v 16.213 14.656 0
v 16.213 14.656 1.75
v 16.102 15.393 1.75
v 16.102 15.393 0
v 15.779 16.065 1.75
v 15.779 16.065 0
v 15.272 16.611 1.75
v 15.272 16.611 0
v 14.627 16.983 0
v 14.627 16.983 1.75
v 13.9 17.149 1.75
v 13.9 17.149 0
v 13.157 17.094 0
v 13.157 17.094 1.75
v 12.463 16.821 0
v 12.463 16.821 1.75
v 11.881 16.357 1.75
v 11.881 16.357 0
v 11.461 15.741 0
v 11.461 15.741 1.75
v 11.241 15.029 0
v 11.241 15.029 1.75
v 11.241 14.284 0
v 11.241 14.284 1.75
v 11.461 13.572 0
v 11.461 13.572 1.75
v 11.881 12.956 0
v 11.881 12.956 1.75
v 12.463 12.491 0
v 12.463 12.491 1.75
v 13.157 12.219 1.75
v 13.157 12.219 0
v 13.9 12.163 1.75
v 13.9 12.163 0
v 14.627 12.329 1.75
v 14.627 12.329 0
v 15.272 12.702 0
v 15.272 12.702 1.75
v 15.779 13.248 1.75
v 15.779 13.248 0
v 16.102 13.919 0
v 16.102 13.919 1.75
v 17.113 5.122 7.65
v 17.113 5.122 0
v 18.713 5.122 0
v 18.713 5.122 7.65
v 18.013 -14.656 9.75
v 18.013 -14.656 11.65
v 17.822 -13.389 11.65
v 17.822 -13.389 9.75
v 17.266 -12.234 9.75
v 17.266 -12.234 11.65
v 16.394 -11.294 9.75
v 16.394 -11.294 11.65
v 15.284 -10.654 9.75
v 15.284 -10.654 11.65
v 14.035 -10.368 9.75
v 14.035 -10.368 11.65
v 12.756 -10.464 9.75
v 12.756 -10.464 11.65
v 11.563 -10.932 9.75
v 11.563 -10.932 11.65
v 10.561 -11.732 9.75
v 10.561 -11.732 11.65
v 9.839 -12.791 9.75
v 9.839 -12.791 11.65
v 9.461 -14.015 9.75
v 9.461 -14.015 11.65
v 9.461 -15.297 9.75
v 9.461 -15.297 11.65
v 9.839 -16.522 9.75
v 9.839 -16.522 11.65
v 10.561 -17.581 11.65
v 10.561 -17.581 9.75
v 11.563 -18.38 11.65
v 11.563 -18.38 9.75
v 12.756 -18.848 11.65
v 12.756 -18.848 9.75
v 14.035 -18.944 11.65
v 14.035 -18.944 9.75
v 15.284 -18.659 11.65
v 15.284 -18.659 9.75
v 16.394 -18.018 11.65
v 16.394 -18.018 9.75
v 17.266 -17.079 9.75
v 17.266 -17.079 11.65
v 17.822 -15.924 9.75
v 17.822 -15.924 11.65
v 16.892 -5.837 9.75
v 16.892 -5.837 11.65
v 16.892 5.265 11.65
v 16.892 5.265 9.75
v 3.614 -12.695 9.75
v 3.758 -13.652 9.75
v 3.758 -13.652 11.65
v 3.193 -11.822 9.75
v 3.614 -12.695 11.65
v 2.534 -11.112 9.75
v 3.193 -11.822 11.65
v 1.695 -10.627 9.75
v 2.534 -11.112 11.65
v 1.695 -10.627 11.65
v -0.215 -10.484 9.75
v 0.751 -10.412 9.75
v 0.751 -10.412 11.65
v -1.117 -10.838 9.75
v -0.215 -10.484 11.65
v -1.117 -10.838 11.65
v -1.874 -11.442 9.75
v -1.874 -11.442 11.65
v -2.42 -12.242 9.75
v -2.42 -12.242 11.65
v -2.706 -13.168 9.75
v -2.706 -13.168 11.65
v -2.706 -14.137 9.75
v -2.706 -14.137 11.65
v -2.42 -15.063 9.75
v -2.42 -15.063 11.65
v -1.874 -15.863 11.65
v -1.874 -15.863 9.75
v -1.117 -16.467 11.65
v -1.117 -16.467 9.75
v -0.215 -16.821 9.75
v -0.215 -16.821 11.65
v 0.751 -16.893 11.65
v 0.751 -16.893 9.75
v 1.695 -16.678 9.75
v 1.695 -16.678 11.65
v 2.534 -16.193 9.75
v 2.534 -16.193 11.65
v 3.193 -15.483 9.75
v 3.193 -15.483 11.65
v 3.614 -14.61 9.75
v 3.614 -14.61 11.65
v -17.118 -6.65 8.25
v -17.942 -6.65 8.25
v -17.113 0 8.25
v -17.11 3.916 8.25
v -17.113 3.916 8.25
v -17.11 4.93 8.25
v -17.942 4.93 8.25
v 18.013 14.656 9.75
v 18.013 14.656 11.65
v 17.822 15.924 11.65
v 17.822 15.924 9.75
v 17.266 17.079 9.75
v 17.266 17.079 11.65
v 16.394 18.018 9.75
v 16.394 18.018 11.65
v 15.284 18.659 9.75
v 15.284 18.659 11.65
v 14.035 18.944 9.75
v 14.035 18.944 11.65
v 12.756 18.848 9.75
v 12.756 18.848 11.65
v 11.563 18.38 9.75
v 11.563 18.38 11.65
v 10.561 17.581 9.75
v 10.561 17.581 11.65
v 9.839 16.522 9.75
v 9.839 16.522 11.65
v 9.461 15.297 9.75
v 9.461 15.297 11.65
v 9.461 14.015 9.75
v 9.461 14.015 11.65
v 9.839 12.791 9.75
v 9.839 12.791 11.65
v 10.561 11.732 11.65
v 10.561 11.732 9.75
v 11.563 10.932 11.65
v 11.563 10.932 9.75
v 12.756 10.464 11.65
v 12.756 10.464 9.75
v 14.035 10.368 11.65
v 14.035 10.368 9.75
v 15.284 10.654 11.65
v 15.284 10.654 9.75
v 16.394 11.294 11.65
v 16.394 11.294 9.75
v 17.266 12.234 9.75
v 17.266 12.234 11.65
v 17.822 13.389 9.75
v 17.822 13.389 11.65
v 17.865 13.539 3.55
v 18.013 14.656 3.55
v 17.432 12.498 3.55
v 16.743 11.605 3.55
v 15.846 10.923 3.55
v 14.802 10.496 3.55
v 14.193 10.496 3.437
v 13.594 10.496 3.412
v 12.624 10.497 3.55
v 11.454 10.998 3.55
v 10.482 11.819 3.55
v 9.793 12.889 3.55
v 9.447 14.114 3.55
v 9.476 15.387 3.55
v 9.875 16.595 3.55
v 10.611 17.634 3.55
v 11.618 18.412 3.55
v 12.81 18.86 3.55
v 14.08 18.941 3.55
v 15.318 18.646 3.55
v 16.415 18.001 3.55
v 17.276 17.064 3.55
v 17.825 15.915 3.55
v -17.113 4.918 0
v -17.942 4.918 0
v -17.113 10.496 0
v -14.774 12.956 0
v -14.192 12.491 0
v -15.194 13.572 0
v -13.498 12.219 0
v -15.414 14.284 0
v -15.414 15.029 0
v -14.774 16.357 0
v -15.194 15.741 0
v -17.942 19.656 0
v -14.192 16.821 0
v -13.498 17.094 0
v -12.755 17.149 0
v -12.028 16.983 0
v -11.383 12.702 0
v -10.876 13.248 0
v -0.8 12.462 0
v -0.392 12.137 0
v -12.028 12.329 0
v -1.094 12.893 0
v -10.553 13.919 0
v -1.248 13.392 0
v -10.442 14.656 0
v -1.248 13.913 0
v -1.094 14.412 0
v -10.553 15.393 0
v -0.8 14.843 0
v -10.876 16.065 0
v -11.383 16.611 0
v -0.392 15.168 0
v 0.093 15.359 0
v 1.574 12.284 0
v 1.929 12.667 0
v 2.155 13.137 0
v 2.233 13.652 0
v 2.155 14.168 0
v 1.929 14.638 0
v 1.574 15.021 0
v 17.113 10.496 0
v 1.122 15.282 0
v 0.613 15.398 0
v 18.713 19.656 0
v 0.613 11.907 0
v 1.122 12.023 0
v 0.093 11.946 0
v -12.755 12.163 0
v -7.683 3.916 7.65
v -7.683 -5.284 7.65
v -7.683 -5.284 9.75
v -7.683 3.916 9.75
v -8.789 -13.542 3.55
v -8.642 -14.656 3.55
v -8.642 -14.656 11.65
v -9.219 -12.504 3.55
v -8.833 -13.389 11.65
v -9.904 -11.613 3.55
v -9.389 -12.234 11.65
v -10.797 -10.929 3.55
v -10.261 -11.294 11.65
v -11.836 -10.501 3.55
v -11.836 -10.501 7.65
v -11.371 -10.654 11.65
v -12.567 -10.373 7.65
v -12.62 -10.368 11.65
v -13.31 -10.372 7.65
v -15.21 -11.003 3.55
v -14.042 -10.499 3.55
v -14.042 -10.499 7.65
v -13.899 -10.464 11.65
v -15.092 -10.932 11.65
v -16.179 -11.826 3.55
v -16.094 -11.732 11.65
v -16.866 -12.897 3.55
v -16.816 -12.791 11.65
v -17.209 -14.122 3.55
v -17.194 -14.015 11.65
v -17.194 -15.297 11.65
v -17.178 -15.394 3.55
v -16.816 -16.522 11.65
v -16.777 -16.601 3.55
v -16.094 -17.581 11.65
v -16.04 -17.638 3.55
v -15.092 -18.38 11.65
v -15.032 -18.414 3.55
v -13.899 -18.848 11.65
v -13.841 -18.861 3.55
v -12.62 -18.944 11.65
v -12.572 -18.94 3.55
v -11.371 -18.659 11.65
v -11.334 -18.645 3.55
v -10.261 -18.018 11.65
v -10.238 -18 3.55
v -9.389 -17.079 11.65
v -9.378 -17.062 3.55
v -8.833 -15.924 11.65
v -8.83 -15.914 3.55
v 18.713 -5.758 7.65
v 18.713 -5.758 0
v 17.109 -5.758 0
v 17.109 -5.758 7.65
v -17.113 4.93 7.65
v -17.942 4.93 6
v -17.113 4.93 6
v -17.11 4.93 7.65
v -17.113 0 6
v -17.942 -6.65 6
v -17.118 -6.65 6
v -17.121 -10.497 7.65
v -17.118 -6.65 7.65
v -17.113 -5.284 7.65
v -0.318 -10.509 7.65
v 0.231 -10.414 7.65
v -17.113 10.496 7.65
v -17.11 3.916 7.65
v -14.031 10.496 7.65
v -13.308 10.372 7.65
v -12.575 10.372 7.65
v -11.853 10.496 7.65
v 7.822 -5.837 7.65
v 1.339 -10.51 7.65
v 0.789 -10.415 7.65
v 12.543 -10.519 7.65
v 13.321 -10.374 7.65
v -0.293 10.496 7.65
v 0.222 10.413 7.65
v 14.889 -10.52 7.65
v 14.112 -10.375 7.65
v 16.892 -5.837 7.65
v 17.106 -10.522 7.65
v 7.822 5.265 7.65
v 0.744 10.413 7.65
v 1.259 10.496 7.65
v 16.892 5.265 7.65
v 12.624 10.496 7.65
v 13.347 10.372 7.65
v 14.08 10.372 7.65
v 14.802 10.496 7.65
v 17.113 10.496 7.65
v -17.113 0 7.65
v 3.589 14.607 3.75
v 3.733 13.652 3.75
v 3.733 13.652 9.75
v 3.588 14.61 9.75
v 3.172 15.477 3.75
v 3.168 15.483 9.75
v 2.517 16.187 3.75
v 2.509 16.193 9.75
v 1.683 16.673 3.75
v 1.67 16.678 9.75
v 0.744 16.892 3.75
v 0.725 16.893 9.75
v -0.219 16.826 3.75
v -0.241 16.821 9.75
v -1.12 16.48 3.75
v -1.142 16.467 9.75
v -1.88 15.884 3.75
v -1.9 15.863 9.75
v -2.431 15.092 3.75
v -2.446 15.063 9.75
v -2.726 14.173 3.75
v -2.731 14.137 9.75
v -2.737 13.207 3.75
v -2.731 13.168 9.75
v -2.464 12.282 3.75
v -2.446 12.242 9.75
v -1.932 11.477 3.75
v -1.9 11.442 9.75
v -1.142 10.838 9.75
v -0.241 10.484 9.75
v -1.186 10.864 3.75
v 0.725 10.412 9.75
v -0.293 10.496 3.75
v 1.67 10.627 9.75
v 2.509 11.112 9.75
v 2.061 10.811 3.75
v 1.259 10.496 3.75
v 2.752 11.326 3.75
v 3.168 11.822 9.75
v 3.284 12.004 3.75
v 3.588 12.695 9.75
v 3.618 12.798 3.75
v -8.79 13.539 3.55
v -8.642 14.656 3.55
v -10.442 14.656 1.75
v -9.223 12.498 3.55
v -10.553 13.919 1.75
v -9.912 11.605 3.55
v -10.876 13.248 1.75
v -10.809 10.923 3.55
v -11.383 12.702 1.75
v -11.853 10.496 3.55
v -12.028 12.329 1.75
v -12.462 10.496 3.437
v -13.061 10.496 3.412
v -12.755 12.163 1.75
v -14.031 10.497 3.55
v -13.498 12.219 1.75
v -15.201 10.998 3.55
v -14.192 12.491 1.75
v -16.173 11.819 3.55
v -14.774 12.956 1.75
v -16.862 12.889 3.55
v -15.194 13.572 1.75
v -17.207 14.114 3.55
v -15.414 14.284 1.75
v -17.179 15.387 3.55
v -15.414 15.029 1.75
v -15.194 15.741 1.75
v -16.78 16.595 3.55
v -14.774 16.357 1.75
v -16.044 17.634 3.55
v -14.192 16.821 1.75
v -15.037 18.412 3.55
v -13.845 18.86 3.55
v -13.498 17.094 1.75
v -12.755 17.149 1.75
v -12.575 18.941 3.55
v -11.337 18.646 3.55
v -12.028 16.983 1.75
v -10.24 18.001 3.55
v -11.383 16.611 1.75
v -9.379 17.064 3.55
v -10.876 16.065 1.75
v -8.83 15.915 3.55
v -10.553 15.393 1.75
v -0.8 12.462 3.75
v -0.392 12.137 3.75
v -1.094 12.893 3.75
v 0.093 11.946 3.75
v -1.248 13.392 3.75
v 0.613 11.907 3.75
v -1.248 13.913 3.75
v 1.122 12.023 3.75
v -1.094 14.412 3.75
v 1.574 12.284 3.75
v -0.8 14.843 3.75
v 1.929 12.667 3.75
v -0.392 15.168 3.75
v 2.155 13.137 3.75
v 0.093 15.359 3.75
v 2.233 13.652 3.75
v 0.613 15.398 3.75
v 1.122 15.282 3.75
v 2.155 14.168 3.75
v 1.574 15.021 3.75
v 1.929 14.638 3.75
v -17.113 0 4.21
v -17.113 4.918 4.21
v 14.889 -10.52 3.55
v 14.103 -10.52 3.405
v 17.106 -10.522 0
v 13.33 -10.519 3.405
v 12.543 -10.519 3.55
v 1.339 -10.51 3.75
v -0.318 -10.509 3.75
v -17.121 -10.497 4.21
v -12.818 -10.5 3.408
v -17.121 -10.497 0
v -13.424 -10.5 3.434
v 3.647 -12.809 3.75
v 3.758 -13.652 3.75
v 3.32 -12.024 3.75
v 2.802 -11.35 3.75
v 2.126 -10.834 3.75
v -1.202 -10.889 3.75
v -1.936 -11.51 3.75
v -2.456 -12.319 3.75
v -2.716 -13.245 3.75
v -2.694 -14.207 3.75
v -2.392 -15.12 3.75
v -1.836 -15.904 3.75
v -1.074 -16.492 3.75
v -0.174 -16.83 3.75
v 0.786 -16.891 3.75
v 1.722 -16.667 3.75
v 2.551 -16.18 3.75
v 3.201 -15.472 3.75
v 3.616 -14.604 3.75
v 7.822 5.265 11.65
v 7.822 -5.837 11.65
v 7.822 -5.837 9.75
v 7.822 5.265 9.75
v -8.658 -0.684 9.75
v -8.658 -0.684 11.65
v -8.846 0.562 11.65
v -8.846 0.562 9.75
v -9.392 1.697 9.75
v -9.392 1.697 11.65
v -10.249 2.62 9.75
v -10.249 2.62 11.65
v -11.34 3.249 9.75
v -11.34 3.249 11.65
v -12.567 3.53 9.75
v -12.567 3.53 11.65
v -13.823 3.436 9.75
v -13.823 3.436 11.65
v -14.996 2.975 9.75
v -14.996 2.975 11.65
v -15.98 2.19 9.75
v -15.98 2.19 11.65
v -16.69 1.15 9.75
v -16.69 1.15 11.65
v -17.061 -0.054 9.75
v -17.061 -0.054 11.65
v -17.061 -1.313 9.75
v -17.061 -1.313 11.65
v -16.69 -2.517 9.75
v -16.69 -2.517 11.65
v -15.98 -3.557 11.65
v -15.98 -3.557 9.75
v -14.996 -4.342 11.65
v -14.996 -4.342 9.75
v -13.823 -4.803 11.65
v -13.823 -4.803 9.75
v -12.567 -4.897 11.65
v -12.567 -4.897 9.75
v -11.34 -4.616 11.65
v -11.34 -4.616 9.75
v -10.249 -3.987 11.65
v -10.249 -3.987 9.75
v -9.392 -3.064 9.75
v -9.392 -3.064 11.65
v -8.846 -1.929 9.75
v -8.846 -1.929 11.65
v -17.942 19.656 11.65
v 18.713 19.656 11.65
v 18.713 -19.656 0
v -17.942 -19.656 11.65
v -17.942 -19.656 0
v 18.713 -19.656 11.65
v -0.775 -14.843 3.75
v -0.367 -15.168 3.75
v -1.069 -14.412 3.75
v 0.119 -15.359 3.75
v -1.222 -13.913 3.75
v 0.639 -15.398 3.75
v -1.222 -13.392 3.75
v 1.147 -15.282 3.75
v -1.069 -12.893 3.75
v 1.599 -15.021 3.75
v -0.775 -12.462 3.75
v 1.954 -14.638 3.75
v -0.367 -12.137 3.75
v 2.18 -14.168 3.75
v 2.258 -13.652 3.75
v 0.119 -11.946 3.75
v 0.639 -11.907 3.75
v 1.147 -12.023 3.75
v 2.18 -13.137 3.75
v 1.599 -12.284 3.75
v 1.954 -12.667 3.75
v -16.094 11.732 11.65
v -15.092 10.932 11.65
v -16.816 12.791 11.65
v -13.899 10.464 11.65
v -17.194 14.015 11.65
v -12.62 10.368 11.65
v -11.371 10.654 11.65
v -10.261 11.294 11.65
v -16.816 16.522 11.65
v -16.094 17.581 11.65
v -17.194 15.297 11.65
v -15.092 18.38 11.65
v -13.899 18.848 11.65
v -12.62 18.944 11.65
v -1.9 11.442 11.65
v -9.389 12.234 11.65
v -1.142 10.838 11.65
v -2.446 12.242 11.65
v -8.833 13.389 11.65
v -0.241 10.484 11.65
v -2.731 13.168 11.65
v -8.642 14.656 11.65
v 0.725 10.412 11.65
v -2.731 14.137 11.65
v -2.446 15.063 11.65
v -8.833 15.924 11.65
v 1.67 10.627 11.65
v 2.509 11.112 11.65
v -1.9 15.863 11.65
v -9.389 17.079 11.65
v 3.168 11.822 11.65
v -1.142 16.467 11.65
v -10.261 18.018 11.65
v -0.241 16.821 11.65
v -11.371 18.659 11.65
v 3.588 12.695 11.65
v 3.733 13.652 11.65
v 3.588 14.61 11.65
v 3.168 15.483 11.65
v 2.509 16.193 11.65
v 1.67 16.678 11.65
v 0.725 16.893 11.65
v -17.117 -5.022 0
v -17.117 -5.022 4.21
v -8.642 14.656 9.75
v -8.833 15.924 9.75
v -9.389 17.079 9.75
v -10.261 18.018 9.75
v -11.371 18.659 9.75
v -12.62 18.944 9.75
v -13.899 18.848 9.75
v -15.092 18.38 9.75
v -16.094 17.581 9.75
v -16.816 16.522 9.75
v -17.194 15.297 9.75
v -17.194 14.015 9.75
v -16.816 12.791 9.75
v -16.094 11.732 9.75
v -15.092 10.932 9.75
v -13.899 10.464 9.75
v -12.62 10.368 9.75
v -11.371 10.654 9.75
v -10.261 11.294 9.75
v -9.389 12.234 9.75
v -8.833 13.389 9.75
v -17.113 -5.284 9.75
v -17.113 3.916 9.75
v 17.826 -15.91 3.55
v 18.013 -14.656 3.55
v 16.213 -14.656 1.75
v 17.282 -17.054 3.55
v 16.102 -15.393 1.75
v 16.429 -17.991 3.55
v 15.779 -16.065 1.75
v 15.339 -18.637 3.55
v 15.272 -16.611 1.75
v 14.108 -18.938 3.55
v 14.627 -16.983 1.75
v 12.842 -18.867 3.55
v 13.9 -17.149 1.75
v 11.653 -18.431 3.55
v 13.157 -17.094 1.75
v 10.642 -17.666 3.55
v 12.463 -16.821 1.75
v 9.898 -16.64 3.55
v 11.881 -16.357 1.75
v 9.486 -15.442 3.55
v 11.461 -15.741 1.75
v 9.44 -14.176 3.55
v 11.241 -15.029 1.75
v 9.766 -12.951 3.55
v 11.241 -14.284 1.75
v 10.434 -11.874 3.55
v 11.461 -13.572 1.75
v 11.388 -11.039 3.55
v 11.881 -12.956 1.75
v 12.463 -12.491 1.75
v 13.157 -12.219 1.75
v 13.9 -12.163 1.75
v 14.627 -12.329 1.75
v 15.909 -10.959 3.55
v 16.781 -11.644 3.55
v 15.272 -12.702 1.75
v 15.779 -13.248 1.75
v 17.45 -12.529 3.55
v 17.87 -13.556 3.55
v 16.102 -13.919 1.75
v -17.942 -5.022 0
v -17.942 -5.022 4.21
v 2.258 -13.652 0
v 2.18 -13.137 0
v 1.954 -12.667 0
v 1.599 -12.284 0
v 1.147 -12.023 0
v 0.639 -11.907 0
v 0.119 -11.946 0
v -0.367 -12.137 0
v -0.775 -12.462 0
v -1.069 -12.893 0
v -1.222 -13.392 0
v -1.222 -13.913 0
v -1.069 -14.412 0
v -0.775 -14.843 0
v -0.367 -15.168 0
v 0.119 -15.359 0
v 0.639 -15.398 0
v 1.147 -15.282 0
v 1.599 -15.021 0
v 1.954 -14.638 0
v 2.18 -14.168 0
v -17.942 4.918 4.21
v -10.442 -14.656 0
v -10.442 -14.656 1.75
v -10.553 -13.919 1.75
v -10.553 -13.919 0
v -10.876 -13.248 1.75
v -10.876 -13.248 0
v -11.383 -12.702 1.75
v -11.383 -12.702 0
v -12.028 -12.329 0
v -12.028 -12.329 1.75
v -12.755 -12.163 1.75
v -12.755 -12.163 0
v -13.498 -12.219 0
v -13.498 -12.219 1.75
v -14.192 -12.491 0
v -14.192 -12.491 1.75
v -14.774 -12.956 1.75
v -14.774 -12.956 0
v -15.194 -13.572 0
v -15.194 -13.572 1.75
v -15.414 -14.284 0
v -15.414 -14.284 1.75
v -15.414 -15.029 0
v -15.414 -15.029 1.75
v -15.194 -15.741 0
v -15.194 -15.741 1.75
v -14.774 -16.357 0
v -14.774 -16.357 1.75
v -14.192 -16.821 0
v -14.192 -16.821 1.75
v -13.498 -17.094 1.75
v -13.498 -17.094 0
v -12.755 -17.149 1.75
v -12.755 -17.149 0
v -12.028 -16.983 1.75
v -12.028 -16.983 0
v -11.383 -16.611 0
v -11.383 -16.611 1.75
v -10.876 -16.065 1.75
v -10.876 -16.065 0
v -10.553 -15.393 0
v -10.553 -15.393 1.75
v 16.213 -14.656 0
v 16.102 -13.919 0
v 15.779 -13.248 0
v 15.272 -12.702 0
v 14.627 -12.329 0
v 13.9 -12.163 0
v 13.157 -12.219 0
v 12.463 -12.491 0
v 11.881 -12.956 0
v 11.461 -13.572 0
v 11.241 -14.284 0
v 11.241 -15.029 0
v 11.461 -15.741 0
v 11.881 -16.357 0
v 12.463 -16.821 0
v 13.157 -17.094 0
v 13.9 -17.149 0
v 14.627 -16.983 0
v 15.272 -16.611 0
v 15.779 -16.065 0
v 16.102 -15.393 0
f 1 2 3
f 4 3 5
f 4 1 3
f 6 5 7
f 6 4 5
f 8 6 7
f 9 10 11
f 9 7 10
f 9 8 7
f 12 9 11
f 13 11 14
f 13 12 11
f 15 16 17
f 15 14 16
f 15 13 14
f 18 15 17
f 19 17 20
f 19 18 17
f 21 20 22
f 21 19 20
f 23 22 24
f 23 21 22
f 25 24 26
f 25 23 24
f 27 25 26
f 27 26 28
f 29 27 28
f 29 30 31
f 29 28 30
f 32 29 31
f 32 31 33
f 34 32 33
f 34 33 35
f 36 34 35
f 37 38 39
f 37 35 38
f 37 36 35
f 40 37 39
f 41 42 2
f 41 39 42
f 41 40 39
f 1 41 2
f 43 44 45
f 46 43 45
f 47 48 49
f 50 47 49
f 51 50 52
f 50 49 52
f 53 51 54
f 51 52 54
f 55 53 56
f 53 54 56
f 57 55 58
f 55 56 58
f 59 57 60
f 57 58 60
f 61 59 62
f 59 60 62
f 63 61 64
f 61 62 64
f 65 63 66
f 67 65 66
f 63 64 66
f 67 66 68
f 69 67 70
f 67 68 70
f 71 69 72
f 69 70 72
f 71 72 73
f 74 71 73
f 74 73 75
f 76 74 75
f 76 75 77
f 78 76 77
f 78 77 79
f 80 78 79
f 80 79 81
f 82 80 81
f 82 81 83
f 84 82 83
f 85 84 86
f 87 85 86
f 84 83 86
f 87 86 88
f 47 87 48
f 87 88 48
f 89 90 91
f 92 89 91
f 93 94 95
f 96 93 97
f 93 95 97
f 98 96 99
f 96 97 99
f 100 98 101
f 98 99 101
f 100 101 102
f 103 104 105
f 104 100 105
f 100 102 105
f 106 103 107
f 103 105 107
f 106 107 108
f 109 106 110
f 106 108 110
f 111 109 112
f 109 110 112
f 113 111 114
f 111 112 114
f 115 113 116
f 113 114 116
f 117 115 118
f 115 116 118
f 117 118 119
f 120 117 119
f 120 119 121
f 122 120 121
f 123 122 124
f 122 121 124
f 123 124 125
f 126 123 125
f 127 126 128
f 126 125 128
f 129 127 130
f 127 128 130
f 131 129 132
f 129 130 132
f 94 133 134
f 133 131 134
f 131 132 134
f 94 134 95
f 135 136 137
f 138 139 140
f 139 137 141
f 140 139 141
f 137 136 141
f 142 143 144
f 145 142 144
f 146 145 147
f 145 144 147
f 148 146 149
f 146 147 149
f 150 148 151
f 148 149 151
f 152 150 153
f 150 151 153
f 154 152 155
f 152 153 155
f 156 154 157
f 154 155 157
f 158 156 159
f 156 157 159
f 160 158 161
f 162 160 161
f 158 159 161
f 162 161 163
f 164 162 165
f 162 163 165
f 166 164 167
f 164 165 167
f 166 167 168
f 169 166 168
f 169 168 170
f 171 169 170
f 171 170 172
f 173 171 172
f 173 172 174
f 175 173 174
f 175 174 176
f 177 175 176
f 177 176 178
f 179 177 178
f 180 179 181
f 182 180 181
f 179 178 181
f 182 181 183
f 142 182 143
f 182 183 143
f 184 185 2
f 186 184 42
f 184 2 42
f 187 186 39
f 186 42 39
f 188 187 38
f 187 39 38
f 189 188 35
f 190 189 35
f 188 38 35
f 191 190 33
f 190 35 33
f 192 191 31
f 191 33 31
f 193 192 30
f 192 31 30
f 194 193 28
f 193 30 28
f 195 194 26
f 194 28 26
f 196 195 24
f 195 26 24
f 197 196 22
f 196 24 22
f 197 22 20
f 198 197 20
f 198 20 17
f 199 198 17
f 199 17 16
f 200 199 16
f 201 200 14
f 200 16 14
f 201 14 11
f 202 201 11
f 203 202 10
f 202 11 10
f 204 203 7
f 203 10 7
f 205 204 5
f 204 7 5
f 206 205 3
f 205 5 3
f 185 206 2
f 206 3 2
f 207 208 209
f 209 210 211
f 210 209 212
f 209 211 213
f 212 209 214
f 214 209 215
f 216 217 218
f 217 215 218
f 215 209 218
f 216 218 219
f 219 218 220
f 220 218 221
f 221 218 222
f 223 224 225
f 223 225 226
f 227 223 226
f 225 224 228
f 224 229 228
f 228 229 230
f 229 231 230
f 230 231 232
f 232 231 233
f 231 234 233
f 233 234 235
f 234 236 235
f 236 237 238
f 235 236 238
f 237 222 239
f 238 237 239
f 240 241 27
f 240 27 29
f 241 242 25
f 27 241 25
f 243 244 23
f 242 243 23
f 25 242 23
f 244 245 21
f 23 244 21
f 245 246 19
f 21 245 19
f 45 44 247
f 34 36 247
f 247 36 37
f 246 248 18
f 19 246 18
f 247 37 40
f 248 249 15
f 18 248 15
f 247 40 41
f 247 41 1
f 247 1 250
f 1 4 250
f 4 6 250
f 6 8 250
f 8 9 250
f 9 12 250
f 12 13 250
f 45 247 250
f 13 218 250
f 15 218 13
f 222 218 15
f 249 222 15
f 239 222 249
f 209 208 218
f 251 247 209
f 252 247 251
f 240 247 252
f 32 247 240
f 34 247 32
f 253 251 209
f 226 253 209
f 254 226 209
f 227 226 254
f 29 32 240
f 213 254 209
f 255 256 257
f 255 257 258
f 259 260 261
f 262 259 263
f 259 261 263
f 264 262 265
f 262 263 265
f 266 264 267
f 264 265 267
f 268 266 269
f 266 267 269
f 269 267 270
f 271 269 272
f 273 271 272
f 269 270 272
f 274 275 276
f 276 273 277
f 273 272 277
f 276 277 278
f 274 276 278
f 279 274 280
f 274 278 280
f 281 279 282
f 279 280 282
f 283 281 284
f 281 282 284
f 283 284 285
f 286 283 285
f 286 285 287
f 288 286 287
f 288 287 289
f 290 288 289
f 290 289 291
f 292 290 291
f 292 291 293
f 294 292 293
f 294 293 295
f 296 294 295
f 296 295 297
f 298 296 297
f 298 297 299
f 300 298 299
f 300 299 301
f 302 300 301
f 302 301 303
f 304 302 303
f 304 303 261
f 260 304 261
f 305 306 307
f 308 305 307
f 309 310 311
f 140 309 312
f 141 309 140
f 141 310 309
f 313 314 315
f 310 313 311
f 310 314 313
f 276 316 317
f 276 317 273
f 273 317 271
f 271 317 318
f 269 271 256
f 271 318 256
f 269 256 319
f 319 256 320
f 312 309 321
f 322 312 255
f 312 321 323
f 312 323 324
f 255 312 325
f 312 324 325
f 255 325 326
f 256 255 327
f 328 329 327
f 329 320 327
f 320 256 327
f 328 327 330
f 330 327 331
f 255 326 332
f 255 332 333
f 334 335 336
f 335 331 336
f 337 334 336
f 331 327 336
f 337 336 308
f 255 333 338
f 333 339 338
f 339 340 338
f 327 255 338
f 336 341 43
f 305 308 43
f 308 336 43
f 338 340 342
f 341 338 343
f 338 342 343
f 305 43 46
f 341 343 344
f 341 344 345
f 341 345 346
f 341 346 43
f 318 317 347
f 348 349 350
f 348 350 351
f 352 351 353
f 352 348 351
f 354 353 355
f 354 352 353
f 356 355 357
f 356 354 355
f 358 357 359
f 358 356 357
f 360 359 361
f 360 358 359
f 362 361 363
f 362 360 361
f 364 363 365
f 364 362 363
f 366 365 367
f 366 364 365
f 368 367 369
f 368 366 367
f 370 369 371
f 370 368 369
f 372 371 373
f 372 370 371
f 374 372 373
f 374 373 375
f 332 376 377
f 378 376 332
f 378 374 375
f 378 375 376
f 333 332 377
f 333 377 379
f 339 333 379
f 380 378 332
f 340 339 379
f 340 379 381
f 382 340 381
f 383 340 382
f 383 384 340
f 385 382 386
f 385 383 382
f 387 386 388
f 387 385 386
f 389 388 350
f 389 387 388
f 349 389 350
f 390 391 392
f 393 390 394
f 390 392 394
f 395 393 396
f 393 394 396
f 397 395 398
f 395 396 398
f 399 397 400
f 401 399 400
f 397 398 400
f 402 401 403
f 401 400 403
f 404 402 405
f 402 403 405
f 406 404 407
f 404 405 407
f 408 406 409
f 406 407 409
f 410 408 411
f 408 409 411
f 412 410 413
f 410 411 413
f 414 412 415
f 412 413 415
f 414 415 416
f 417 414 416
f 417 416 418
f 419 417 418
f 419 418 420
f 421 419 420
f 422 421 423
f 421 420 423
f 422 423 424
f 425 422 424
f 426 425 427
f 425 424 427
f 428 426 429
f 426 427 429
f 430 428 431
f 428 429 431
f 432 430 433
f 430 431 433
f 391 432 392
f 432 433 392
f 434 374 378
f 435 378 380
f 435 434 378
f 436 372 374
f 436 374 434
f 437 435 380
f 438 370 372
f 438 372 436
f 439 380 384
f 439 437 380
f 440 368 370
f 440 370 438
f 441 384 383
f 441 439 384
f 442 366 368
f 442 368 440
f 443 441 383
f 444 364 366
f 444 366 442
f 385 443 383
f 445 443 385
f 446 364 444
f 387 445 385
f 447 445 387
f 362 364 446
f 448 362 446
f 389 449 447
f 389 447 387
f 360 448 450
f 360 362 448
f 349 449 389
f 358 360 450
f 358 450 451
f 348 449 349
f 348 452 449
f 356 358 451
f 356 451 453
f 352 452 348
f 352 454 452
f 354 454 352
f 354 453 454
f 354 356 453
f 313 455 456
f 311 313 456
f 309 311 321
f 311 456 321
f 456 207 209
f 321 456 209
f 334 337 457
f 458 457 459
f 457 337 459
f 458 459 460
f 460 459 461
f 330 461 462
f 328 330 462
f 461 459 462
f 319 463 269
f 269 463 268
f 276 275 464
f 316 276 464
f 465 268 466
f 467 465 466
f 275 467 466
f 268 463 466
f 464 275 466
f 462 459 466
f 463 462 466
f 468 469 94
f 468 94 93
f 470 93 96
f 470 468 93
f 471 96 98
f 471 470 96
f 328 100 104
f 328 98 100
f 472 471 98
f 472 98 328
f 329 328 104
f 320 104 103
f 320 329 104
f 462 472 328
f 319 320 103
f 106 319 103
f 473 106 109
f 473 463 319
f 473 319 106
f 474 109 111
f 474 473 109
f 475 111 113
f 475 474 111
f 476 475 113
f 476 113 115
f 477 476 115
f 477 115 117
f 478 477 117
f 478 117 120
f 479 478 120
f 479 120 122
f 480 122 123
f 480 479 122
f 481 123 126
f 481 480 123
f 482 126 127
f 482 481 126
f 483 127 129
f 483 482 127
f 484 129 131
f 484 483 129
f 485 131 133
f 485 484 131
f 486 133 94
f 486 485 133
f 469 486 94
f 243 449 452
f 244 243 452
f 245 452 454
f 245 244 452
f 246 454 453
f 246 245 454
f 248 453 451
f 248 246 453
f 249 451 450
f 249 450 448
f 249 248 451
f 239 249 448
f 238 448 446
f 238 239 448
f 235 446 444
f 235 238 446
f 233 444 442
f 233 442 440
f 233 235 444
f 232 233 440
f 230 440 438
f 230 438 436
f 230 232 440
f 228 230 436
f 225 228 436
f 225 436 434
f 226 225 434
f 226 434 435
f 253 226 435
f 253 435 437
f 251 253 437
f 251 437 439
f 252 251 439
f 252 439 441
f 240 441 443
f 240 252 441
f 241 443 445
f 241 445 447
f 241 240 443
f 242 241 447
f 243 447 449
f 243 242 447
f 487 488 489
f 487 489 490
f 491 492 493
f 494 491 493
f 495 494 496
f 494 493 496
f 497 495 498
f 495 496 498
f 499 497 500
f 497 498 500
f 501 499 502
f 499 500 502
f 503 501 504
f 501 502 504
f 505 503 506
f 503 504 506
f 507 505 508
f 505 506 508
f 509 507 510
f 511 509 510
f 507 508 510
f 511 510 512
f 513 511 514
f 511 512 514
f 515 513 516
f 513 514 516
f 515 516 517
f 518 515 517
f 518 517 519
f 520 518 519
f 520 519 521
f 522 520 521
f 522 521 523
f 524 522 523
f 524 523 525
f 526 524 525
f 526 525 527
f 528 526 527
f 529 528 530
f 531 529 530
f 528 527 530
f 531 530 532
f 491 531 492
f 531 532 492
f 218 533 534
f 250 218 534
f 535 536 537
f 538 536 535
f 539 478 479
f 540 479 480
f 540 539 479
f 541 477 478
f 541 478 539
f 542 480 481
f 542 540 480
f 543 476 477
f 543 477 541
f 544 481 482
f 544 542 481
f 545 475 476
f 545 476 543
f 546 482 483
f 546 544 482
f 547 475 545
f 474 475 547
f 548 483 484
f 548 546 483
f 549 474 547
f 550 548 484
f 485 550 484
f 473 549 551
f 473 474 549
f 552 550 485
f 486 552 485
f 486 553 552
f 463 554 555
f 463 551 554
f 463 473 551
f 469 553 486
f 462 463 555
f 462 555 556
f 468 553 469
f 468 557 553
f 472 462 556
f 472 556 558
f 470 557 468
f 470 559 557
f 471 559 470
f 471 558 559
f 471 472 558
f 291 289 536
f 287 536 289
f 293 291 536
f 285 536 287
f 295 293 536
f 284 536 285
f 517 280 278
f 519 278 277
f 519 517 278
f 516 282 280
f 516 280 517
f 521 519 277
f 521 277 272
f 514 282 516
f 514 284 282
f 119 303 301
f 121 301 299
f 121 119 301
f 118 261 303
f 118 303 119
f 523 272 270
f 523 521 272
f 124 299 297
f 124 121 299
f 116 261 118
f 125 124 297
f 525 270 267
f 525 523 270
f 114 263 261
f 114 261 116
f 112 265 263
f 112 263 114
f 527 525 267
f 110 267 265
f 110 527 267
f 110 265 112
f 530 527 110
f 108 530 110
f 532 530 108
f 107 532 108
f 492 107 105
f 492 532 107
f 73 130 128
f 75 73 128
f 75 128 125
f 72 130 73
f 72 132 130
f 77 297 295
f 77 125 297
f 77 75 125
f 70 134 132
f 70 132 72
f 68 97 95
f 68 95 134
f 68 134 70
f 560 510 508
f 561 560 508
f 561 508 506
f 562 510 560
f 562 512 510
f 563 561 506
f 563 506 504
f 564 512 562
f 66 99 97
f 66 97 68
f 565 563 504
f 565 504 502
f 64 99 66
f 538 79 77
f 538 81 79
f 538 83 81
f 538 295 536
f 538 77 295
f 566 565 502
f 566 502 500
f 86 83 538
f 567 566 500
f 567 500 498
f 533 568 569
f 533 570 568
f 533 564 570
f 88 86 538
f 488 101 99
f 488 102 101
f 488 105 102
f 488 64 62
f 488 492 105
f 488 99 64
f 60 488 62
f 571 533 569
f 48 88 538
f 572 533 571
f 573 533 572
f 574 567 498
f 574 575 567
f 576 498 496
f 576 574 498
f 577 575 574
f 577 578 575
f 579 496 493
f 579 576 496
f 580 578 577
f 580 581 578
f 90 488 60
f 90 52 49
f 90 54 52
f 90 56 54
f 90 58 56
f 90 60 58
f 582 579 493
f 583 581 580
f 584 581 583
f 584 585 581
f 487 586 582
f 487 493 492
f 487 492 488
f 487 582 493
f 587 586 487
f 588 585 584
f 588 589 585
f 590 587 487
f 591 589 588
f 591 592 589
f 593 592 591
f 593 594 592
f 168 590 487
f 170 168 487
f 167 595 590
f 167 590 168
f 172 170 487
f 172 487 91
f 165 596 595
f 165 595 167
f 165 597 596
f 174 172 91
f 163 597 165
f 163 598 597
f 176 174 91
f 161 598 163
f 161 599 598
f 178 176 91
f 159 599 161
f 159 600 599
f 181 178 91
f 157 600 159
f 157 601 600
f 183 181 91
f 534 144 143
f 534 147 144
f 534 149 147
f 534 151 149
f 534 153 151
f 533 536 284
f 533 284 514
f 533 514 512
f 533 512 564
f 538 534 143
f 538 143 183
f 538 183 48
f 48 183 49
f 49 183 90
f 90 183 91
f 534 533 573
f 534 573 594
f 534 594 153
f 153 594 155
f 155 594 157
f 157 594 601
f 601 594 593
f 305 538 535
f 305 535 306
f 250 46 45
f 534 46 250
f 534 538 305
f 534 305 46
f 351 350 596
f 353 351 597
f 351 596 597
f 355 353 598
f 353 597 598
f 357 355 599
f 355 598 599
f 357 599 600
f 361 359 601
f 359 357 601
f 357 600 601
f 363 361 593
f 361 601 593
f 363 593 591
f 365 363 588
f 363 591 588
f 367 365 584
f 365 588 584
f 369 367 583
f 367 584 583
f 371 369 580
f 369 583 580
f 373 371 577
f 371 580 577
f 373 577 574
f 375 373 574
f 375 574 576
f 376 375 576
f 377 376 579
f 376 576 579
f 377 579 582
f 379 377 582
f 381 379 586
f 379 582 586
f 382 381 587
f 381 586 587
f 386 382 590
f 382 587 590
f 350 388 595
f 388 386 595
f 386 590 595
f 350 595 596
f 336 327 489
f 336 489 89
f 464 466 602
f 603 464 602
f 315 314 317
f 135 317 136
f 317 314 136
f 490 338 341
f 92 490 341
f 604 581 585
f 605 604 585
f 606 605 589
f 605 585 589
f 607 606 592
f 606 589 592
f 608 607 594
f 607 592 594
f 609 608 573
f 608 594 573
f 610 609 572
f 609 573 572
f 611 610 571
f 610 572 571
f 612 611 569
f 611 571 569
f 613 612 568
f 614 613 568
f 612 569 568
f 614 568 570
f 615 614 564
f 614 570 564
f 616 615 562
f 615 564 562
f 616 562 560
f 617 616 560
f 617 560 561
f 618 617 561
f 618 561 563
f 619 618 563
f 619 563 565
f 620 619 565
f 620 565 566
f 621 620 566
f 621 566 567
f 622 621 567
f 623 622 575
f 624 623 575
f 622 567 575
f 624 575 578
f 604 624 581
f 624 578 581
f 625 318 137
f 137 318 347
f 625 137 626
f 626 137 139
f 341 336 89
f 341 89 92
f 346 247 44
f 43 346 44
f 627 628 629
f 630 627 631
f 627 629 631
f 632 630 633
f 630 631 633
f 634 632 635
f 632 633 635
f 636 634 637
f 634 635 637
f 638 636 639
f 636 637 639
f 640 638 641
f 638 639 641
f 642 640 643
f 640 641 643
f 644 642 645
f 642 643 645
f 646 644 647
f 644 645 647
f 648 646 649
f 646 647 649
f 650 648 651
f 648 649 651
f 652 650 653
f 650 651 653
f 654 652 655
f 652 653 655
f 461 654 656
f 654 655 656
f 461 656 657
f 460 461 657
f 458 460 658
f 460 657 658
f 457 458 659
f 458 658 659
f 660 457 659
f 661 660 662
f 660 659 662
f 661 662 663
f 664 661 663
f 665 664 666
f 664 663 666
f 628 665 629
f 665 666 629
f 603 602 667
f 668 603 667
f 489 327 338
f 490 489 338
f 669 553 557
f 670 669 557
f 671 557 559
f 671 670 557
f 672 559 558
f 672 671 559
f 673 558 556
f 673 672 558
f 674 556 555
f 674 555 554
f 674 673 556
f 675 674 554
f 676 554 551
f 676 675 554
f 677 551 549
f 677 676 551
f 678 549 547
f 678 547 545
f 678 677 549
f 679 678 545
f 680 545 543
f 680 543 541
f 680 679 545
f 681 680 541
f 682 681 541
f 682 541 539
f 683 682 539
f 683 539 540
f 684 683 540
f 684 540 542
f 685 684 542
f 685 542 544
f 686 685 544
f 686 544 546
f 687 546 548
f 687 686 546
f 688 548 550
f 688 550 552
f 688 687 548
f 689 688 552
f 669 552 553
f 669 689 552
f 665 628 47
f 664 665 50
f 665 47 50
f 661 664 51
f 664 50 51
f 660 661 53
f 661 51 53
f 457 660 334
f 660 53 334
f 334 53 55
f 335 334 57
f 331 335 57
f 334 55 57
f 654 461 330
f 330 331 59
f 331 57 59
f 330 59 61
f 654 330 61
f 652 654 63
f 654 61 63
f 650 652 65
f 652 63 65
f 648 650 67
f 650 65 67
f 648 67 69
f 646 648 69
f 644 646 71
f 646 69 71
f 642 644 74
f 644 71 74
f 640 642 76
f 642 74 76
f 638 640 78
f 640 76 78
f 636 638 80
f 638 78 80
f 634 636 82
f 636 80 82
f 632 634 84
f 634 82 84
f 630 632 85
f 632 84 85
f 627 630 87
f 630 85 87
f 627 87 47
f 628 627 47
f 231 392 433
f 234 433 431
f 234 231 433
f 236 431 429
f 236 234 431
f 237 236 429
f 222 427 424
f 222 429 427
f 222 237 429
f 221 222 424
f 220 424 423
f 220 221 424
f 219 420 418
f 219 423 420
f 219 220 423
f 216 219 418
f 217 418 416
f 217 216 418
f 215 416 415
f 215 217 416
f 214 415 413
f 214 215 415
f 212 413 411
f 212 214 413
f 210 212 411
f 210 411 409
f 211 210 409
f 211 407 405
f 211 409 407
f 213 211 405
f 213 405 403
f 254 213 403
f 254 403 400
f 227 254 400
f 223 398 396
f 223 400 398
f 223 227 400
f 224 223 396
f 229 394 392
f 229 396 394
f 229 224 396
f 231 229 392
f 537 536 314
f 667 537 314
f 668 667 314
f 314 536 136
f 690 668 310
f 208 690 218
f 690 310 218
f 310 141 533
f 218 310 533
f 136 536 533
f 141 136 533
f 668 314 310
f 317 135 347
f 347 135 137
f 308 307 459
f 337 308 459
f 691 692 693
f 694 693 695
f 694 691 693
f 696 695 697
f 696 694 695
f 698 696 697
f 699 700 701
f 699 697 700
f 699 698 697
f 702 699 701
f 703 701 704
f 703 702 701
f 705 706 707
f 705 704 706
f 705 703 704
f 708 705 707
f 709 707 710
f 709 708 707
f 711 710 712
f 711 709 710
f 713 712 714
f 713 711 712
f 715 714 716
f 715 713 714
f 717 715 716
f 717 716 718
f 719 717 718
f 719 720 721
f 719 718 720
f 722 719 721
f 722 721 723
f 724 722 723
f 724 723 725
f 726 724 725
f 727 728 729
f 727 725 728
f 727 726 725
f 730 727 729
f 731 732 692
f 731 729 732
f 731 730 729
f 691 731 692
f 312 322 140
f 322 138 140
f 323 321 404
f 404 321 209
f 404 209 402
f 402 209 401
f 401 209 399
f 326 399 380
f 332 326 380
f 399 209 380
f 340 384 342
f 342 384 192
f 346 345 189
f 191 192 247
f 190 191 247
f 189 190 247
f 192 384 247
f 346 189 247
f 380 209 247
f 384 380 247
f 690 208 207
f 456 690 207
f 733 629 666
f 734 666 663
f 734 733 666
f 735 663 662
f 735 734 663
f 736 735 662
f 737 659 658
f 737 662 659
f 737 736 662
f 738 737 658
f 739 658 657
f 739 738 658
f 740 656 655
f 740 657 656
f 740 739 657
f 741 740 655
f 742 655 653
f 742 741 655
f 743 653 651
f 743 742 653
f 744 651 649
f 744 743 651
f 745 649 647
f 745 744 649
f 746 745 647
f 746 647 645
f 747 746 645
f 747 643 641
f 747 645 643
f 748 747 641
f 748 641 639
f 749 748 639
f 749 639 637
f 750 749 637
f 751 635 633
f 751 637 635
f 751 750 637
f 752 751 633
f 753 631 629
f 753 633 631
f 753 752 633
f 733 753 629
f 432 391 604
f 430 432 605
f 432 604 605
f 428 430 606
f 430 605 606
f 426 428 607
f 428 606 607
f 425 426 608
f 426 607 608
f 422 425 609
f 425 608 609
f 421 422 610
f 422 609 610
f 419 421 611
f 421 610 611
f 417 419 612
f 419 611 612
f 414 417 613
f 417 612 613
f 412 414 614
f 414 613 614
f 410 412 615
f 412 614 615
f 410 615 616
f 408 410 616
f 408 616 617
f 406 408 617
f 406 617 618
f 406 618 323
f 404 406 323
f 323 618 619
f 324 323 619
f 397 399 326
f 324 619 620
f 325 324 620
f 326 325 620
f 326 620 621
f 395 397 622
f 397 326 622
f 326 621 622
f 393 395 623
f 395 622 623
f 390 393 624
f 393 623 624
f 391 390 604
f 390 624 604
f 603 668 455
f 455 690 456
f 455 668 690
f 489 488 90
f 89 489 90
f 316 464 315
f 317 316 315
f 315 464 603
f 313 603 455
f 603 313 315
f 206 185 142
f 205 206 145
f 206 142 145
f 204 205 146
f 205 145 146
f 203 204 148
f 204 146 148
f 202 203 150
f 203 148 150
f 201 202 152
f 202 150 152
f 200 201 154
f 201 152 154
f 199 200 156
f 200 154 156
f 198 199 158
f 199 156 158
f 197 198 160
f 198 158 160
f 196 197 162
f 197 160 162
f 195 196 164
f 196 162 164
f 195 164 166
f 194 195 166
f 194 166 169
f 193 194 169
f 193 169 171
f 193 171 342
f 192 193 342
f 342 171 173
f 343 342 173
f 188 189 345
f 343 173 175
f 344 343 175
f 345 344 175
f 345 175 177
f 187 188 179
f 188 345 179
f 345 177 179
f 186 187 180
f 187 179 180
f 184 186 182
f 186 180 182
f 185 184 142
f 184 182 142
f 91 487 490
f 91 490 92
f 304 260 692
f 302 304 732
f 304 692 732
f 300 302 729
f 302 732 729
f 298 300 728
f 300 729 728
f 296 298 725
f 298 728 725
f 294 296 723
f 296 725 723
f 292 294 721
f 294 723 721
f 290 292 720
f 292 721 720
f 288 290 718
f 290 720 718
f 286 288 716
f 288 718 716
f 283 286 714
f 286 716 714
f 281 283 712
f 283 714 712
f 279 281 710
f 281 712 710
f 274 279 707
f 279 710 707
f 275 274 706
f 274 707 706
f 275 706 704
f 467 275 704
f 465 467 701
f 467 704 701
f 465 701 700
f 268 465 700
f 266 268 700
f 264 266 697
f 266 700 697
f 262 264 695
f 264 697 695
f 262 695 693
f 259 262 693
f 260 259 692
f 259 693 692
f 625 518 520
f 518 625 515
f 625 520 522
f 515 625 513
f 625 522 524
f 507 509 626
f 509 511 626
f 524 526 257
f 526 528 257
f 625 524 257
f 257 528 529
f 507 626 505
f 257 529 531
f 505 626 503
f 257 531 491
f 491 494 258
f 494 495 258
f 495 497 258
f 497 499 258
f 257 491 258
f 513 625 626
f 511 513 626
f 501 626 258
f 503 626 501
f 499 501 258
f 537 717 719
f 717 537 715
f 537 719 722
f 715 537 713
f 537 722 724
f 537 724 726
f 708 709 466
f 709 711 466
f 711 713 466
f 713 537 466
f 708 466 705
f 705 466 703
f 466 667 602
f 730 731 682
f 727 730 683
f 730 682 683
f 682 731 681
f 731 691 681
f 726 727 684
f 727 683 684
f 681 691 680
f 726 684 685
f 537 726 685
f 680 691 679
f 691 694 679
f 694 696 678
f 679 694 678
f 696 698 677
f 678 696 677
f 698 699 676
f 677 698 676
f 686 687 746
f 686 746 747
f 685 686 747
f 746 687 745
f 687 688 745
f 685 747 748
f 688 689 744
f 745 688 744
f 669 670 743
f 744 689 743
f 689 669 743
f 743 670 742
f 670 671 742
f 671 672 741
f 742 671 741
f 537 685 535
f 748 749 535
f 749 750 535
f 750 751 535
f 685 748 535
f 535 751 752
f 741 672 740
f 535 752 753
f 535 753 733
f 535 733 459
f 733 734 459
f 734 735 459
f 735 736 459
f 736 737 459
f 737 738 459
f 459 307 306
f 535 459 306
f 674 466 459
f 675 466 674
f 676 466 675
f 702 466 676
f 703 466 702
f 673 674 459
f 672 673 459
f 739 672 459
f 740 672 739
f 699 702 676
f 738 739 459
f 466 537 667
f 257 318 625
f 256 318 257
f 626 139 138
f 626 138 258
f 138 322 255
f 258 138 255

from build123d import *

# Parameters (mm, degrees)
BOSS_EXTRUDE1_OUTLINE_R   = 2.5
BOSS_EXTRUDE1_OUTLINE_R_2 = 1.75
BOSS_EXTRUDE1_DEPTH       = 4.21
BOSS_EXTRUDE2_START       = 4.21
BOSS_EXTRUDE2_OUTLINE_R   = 2.5
BOSS_EXTRUDE2_OUTLINE_R_2 = 1.75
BOSS_EXTRUDE2_DEPTH       = 5.539999985
BOSS_EXTRUDE3_START       = -2.1
SKETCH3_W                 = 36.654989836
SKETCH3_H                 = 39.3126
SKETCH3_R                 = 2.5
SKETCH3_R_2               = 3.25
SKETCH3_W_2               = 9.43005
SKETCH3_H_2               = 9.2
SKETCH3_W_3               = 9.07015
SKETCH3_H_3               = 11.10254
BOSS_EXTRUDE3_DEPTH       = 2.1
CUT_EXTRUDE1_START        = -6
SKETCH3_2_R               = 3.25
SKETCH3_2_R_2             = 1.75
CUT_EXTRUDE1_DEPTH        = 6
SKETCH5_R                 = 4.3
CUT_EXTRUDE2_DEPTH        = 5
CHAMFER1_SIZE             = 3
CUT_EXTRUDE3_REACH        = 44.72
SKETCH6_W                 = 2.25
SKETCH6_H                 = 11.58
BOSS_EXTRUDE5_START       = 1.9
SKETCH7_W                 = 36.654989836
SKETCH7_H                 = 39.3126
SKETCH7_R                 = 4.3
SKETCH7_R_2               = 3.25
SKETCH7_W_2               = 10.43005
SKETCH7_H_2               = 10.2
SKETCH7_W_3               = 9.07015
SKETCH7_H_3               = 11.10254
SKETCH7_W_4               = 9.43005
SKETCH7_H_4               = 9.2
SKETCH7_R_3               = 4.225
BOSS_EXTRUDE5_DEPTH       = 1.9


# Read off the part's stored shape, not the designer's step: Boss-Extrude1, Boss-Extrude2
with BuildPart() as part:
    # Boss-Extrude1 outline → Boss-Extrude1 (new body)
    # profile 1 of 2: a face of its own
    with BuildSketch(Plane.XY):
        Polygon((17.1132, 10.4965), (17.1132, 5.1225), (18.7132, 5.1225), (18.7132, 19.6563), (-17.941789836, 19.6563), (-17.941789836, 4.917774053), (-17.1132, 4.917774053), (-17.1132, 10.4965), align=None)
        with Locations((-12.941789836, 14.6563)):
            Circle(BOSS_EXTRUDE1_OUTLINE_R, mode=Mode.SUBTRACT)
        with Locations((0.4826, 13.6525)):
            Circle(BOSS_EXTRUDE1_OUTLINE_R_2, mode=Mode.SUBTRACT)
        with Locations((13.7132, 14.6563)):
            Circle(BOSS_EXTRUDE1_OUTLINE_R, mode=Mode.SUBTRACT)
    # profile 2 of 2: a face of its own
    with BuildSketch(Plane.XY):
        Polygon((18.7132, -19.6563), (18.7132, -5.7575), (17.109037456, -5.7575), (17.105585288, -10.521897241), (-17.120805727, -10.497097621), (-17.116838767, -5.022225947), (-17.941789836, -5.022225947), (-17.941789836, -19.6563), align=None)
        with Locations((-12.941789836, -14.6563)):
            Circle(BOSS_EXTRUDE1_OUTLINE_R, mode=Mode.SUBTRACT)
        with Locations((0.508, -13.6525)):
            Circle(BOSS_EXTRUDE1_OUTLINE_R_2, mode=Mode.SUBTRACT)
        with Locations((13.7132, -14.6563)):
            Circle(BOSS_EXTRUDE1_OUTLINE_R, mode=Mode.SUBTRACT)
    extrude(amount=BOSS_EXTRUDE1_DEPTH)

    # Boss-Extrude2 outline → Boss-Extrude2 (add)
    with BuildSketch(Plane.XY.offset(BOSS_EXTRUDE2_START)):
        Polygon((17.1132, 10.4965), (17.1132, 5.1225), (18.7132, 5.1225), (18.7132, 19.6563), (-17.941789836, 19.6563), (-17.941789836, -19.6563), (18.7132, -19.6563), (18.7132, -5.7575), (17.109037456, -5.7575), (17.105585288, -10.521897241), (-17.120805727, -10.497097621), (-17.1132, -0.000300188), (-17.1132, 10.4965), align=None)
        with Locations((-12.941789836, -14.6563)):
            Circle(BOSS_EXTRUDE2_OUTLINE_R, mode=Mode.SUBTRACT)
        with Locations((0.508, -13.6525)):
            Circle(BOSS_EXTRUDE2_OUTLINE_R_2, mode=Mode.SUBTRACT)
        with Locations((13.7132, -14.6563)):
            Circle(BOSS_EXTRUDE2_OUTLINE_R, mode=Mode.SUBTRACT)
        with Locations((-12.941789836, 14.6563)):
            Circle(BOSS_EXTRUDE2_OUTLINE_R, mode=Mode.SUBTRACT)
        with Locations((0.4826, 13.6525)):
            Circle(BOSS_EXTRUDE2_OUTLINE_R_2, mode=Mode.SUBTRACT)
        with Locations((13.7132, 14.6563)):
            Circle(BOSS_EXTRUDE2_OUTLINE_R, mode=Mode.SUBTRACT)
    extrude(amount=BOSS_EXTRUDE2_DEPTH)

    # Sketch3 → Boss-Extrude3 (add)
    with BuildSketch(Plane.XY.offset(9.749999985).offset(BOSS_EXTRUDE3_START)):
        with Locations((0.385705082, 0)):
            Rectangle(SKETCH3_W, SKETCH3_H)
        with Locations((-12.941789836, 14.6563)):
            Circle(SKETCH3_R, mode=Mode.SUBTRACT)
        with Locations((13.7132, 14.6563)):
            Circle(SKETCH3_R, mode=Mode.SUBTRACT)
        with Locations((-12.941789836, -14.6563)):
            Circle(SKETCH3_R, mode=Mode.SUBTRACT)
        with Locations((13.7132, -14.6563)):
            Circle(SKETCH3_R, mode=Mode.SUBTRACT)
        with Locations((0.508, -13.6525)):
            Circle(SKETCH3_R_2, mode=Mode.SUBTRACT)
        with Locations((0.4826, 13.6525)):
            Circle(SKETCH3_R_2, mode=Mode.SUBTRACT)
        with Locations((-12.398175, -0.6835)):
            Rectangle(SKETCH3_W_2, SKETCH3_H_2, mode=Mode.SUBTRACT)
        with Locations((12.357075, -0.28623)):
            Rectangle(SKETCH3_W_3, SKETCH3_H_3, mode=Mode.SUBTRACT)
    extrude(amount=BOSS_EXTRUDE3_DEPTH)

    # Sketch3<2> → Cut-Extrude1 (cut)
    # profile 1 of 2: a face of its own
    with BuildSketch(Plane.XY.offset(9.749999985).offset(CUT_EXTRUDE1_START)):
        with Locations((0.4826, 13.6525)):
            Circle(SKETCH3_2_R)
        with Locations((0.4826, 13.6525)):
            Circle(SKETCH3_2_R_2, mode=Mode.SUBTRACT)
    # profile 2 of 2: a face of its own
    with BuildSketch(Plane.XY.offset(9.749999985).offset(CUT_EXTRUDE1_START)):
        with Locations((0.508, -13.6525)):
            Circle(SKETCH3_2_R)
        with Locations((0.508, -13.6525)):
            Circle(SKETCH3_2_R_2, mode=Mode.SUBTRACT)
    extrude(amount=CUT_EXTRUDE1_DEPTH, mode=Mode.SUBTRACT)

    # Sketch5 → Cut-Extrude2 (cut)
    with BuildSketch(Plane.XY.offset(9.749999985)):
        with Locations((-12.941789836, 14.6563)):
            Circle(SKETCH5_R)
        with Locations((13.7132, 14.6563)):
            Circle(SKETCH5_R)
        with Locations((-12.941789836, -14.6563)):
            Circle(SKETCH5_R)
        with Locations((13.7132, -14.6563)):
            Circle(SKETCH5_R)
    extrude(amount=-CUT_EXTRUDE2_DEPTH, mode=Mode.SUBTRACT)

    # Chamfer1
    # the kernel refuses this chamfer: 3 mm, written as the material it takes off along each edge
    with BuildSketch(Plane(origin=(13.7132, 14.6563, 4.749999985), x_dir=(1, 0, 0), z_dir=(0, 1, 0))) as chamfer1_piece_1_section:
        Polygon((2.5 + CHAMFER1_SIZE, 0), (2.5, CHAMFER1_SIZE), (2.5, 0), align=None)
    chamfer1_piece_1 = revolve(axis=Axis((13.7132, 14.6563, 4.749999985), (0, 0, -1)), mode=Mode.PRIVATE)
    chamfer1_piece_1 = chamfer1_piece_1 & Plane(origin=(13.7132, 14.6563, 2.638456685), x_dir=(1, 0, 0), z_dir=(0, 0, 1)) * Cylinder(4.3, 22, mode=Mode.PRIVATE)
    add(chamfer1_piece_1, mode=Mode.SUBTRACT)
    with BuildSketch(Plane(origin=(-12.941789836, -14.6563, 4.749999985), x_dir=(1, 0, 0), z_dir=(0, 1, 0))) as chamfer1_piece_2_section:
        Polygon((2.5 + CHAMFER1_SIZE, 0), (2.5, CHAMFER1_SIZE), (2.5, 0), align=None)
    chamfer1_piece_2 = revolve(axis=Axis((-12.941789836, -14.6563, 4.749999985), (0, 0, -1)), mode=Mode.PRIVATE)
    chamfer1_piece_2 = chamfer1_piece_2 & Plane(origin=(-12.941789836, -14.6563, 2.638456685), x_dir=(1, 0, 0), z_dir=(0, 0, 1)) * Cylinder(4.3, 22, mode=Mode.PRIVATE)
    add(chamfer1_piece_2, mode=Mode.SUBTRACT)
    with BuildSketch(Plane(origin=(13.7132, -14.6563, 4.749999985), x_dir=(1, 0, 0), z_dir=(0, 1, 0))) as chamfer1_piece_3_section:
        Polygon((2.5 + CHAMFER1_SIZE, 0), (2.5, CHAMFER1_SIZE), (2.5, 0), align=None)
    chamfer1_piece_3 = revolve(axis=Axis((13.7132, -14.6563, 4.749999985), (0, 0, -1)), mode=Mode.PRIVATE)
    chamfer1_piece_3 = chamfer1_piece_3 & Plane(origin=(13.7132, -14.6563, 2.638456685), x_dir=(1, 0, 0), z_dir=(0, 0, 1)) * Cylinder(4.3, 22, mode=Mode.PRIVATE)
    add(chamfer1_piece_3, mode=Mode.SUBTRACT)
    with BuildSketch(Plane(origin=(-12.941789836, 14.6563, 4.749999985), x_dir=(1, 0, 0), z_dir=(0, 1, 0))) as chamfer1_piece_4_section:
        Polygon((2.5 + CHAMFER1_SIZE, 0), (2.5, CHAMFER1_SIZE), (2.5, 0), align=None)
    chamfer1_piece_4 = revolve(axis=Axis((-12.941789836, 14.6563, 4.749999985), (0, 0, -1)), mode=Mode.PRIVATE)
    chamfer1_piece_4 = chamfer1_piece_4 & Plane(origin=(-12.941789836, 14.6563, 2.638456685), x_dir=(1, 0, 0), z_dir=(0, 0, 1)) * Cylinder(4.3, 22, mode=Mode.PRIVATE)
    add(chamfer1_piece_4, mode=Mode.SUBTRACT)

    # Cut-Extrude3: up to this face of the body (flat: up to its plane)
    cut_extrude3_end = Plane(part.part.faces().sort_by_distance((-17.118822247, -7.759661784, 2.105))[0])
    # Sketch6 → Cut-Extrude3 (cut, up to the picked face)
    with BuildSketch(Plane.ZY.offset(17.941789836), mode=Mode.PRIVATE) as cut_extrude3_sk1:
        with Locations((7.124999985, -0.86020819)):
            Rectangle(SKETCH6_W, SKETCH6_H)
    cut_extrude3_tool1 = split(extrude(cut_extrude3_sk1.sketch, amount=-CUT_EXTRUDE3_REACH, mode=Mode.PRIVATE), bisect_by=cut_extrude3_end, keep=Keep.BOTH, mode=Mode.PRIVATE)
    add(cut_extrude3_tool1.solids().sort_by(Axis((-17.94179, -0.860208, 7.125), (1, 0, 0)))[0], mode=Mode.SUBTRACT)

    # Sketch7 → Boss-Extrude5 (add)
    # profile 1 of 3: a face of its own
    with BuildSketch(Plane.XY.offset(9.749999985).offset(BOSS_EXTRUDE5_START)):
        with Locations((0.385705082, 0)):
            Rectangle(SKETCH7_W, SKETCH7_H)
        with Locations((13.7132, 14.6563)):
            Circle(SKETCH7_R, mode=Mode.SUBTRACT)
        with Locations((13.7132, -14.6563)):
            Circle(SKETCH7_R, mode=Mode.SUBTRACT)
        with Locations((0.4826, 13.6525)):
            Circle(SKETCH7_R_2, mode=Mode.SUBTRACT)
        with Locations((0.508, -13.6525)):
            Circle(SKETCH7_R_2, mode=Mode.SUBTRACT)
        with Locations((-12.941789836, 14.6563)):
            Circle(SKETCH7_R, mode=Mode.SUBTRACT)
        with Locations((-12.941789836, -14.6563)):
            Circle(SKETCH7_R, mode=Mode.SUBTRACT)
        with Locations((-12.398175, -0.6835)):
            Rectangle(SKETCH7_W_2, SKETCH7_H_2, mode=Mode.SUBTRACT)
        with Locations((12.357075, -0.28623)):
            Rectangle(SKETCH7_W_3, SKETCH7_H_3, mode=Mode.SUBTRACT)
    # profile 2 of 3: a face of its own
    with BuildSketch(Plane.XY.offset(9.749999985).offset(BOSS_EXTRUDE5_START)):
        with Locations((-12.398175, -0.6835)):
            Rectangle(SKETCH7_W_2, SKETCH7_H_2)
        with Locations((-12.398175, -0.6835)):
            Rectangle(SKETCH7_W_4, SKETCH7_H_4, mode=Mode.SUBTRACT)
    # profile 3 of 3: a face of its own
    with BuildSketch(Plane.XY.offset(9.749999985).offset(BOSS_EXTRUDE5_START)):
        with Locations((-12.398175, -0.6835)):
            Rectangle(SKETCH7_W_4, SKETCH7_H_4)
        with Locations((-12.88315, -0.6835)):
            Circle(SKETCH7_R_3, mode=Mode.SUBTRACT)
    extrude(amount=-BOSS_EXTRUDE5_DEPTH)


solid = part.part
